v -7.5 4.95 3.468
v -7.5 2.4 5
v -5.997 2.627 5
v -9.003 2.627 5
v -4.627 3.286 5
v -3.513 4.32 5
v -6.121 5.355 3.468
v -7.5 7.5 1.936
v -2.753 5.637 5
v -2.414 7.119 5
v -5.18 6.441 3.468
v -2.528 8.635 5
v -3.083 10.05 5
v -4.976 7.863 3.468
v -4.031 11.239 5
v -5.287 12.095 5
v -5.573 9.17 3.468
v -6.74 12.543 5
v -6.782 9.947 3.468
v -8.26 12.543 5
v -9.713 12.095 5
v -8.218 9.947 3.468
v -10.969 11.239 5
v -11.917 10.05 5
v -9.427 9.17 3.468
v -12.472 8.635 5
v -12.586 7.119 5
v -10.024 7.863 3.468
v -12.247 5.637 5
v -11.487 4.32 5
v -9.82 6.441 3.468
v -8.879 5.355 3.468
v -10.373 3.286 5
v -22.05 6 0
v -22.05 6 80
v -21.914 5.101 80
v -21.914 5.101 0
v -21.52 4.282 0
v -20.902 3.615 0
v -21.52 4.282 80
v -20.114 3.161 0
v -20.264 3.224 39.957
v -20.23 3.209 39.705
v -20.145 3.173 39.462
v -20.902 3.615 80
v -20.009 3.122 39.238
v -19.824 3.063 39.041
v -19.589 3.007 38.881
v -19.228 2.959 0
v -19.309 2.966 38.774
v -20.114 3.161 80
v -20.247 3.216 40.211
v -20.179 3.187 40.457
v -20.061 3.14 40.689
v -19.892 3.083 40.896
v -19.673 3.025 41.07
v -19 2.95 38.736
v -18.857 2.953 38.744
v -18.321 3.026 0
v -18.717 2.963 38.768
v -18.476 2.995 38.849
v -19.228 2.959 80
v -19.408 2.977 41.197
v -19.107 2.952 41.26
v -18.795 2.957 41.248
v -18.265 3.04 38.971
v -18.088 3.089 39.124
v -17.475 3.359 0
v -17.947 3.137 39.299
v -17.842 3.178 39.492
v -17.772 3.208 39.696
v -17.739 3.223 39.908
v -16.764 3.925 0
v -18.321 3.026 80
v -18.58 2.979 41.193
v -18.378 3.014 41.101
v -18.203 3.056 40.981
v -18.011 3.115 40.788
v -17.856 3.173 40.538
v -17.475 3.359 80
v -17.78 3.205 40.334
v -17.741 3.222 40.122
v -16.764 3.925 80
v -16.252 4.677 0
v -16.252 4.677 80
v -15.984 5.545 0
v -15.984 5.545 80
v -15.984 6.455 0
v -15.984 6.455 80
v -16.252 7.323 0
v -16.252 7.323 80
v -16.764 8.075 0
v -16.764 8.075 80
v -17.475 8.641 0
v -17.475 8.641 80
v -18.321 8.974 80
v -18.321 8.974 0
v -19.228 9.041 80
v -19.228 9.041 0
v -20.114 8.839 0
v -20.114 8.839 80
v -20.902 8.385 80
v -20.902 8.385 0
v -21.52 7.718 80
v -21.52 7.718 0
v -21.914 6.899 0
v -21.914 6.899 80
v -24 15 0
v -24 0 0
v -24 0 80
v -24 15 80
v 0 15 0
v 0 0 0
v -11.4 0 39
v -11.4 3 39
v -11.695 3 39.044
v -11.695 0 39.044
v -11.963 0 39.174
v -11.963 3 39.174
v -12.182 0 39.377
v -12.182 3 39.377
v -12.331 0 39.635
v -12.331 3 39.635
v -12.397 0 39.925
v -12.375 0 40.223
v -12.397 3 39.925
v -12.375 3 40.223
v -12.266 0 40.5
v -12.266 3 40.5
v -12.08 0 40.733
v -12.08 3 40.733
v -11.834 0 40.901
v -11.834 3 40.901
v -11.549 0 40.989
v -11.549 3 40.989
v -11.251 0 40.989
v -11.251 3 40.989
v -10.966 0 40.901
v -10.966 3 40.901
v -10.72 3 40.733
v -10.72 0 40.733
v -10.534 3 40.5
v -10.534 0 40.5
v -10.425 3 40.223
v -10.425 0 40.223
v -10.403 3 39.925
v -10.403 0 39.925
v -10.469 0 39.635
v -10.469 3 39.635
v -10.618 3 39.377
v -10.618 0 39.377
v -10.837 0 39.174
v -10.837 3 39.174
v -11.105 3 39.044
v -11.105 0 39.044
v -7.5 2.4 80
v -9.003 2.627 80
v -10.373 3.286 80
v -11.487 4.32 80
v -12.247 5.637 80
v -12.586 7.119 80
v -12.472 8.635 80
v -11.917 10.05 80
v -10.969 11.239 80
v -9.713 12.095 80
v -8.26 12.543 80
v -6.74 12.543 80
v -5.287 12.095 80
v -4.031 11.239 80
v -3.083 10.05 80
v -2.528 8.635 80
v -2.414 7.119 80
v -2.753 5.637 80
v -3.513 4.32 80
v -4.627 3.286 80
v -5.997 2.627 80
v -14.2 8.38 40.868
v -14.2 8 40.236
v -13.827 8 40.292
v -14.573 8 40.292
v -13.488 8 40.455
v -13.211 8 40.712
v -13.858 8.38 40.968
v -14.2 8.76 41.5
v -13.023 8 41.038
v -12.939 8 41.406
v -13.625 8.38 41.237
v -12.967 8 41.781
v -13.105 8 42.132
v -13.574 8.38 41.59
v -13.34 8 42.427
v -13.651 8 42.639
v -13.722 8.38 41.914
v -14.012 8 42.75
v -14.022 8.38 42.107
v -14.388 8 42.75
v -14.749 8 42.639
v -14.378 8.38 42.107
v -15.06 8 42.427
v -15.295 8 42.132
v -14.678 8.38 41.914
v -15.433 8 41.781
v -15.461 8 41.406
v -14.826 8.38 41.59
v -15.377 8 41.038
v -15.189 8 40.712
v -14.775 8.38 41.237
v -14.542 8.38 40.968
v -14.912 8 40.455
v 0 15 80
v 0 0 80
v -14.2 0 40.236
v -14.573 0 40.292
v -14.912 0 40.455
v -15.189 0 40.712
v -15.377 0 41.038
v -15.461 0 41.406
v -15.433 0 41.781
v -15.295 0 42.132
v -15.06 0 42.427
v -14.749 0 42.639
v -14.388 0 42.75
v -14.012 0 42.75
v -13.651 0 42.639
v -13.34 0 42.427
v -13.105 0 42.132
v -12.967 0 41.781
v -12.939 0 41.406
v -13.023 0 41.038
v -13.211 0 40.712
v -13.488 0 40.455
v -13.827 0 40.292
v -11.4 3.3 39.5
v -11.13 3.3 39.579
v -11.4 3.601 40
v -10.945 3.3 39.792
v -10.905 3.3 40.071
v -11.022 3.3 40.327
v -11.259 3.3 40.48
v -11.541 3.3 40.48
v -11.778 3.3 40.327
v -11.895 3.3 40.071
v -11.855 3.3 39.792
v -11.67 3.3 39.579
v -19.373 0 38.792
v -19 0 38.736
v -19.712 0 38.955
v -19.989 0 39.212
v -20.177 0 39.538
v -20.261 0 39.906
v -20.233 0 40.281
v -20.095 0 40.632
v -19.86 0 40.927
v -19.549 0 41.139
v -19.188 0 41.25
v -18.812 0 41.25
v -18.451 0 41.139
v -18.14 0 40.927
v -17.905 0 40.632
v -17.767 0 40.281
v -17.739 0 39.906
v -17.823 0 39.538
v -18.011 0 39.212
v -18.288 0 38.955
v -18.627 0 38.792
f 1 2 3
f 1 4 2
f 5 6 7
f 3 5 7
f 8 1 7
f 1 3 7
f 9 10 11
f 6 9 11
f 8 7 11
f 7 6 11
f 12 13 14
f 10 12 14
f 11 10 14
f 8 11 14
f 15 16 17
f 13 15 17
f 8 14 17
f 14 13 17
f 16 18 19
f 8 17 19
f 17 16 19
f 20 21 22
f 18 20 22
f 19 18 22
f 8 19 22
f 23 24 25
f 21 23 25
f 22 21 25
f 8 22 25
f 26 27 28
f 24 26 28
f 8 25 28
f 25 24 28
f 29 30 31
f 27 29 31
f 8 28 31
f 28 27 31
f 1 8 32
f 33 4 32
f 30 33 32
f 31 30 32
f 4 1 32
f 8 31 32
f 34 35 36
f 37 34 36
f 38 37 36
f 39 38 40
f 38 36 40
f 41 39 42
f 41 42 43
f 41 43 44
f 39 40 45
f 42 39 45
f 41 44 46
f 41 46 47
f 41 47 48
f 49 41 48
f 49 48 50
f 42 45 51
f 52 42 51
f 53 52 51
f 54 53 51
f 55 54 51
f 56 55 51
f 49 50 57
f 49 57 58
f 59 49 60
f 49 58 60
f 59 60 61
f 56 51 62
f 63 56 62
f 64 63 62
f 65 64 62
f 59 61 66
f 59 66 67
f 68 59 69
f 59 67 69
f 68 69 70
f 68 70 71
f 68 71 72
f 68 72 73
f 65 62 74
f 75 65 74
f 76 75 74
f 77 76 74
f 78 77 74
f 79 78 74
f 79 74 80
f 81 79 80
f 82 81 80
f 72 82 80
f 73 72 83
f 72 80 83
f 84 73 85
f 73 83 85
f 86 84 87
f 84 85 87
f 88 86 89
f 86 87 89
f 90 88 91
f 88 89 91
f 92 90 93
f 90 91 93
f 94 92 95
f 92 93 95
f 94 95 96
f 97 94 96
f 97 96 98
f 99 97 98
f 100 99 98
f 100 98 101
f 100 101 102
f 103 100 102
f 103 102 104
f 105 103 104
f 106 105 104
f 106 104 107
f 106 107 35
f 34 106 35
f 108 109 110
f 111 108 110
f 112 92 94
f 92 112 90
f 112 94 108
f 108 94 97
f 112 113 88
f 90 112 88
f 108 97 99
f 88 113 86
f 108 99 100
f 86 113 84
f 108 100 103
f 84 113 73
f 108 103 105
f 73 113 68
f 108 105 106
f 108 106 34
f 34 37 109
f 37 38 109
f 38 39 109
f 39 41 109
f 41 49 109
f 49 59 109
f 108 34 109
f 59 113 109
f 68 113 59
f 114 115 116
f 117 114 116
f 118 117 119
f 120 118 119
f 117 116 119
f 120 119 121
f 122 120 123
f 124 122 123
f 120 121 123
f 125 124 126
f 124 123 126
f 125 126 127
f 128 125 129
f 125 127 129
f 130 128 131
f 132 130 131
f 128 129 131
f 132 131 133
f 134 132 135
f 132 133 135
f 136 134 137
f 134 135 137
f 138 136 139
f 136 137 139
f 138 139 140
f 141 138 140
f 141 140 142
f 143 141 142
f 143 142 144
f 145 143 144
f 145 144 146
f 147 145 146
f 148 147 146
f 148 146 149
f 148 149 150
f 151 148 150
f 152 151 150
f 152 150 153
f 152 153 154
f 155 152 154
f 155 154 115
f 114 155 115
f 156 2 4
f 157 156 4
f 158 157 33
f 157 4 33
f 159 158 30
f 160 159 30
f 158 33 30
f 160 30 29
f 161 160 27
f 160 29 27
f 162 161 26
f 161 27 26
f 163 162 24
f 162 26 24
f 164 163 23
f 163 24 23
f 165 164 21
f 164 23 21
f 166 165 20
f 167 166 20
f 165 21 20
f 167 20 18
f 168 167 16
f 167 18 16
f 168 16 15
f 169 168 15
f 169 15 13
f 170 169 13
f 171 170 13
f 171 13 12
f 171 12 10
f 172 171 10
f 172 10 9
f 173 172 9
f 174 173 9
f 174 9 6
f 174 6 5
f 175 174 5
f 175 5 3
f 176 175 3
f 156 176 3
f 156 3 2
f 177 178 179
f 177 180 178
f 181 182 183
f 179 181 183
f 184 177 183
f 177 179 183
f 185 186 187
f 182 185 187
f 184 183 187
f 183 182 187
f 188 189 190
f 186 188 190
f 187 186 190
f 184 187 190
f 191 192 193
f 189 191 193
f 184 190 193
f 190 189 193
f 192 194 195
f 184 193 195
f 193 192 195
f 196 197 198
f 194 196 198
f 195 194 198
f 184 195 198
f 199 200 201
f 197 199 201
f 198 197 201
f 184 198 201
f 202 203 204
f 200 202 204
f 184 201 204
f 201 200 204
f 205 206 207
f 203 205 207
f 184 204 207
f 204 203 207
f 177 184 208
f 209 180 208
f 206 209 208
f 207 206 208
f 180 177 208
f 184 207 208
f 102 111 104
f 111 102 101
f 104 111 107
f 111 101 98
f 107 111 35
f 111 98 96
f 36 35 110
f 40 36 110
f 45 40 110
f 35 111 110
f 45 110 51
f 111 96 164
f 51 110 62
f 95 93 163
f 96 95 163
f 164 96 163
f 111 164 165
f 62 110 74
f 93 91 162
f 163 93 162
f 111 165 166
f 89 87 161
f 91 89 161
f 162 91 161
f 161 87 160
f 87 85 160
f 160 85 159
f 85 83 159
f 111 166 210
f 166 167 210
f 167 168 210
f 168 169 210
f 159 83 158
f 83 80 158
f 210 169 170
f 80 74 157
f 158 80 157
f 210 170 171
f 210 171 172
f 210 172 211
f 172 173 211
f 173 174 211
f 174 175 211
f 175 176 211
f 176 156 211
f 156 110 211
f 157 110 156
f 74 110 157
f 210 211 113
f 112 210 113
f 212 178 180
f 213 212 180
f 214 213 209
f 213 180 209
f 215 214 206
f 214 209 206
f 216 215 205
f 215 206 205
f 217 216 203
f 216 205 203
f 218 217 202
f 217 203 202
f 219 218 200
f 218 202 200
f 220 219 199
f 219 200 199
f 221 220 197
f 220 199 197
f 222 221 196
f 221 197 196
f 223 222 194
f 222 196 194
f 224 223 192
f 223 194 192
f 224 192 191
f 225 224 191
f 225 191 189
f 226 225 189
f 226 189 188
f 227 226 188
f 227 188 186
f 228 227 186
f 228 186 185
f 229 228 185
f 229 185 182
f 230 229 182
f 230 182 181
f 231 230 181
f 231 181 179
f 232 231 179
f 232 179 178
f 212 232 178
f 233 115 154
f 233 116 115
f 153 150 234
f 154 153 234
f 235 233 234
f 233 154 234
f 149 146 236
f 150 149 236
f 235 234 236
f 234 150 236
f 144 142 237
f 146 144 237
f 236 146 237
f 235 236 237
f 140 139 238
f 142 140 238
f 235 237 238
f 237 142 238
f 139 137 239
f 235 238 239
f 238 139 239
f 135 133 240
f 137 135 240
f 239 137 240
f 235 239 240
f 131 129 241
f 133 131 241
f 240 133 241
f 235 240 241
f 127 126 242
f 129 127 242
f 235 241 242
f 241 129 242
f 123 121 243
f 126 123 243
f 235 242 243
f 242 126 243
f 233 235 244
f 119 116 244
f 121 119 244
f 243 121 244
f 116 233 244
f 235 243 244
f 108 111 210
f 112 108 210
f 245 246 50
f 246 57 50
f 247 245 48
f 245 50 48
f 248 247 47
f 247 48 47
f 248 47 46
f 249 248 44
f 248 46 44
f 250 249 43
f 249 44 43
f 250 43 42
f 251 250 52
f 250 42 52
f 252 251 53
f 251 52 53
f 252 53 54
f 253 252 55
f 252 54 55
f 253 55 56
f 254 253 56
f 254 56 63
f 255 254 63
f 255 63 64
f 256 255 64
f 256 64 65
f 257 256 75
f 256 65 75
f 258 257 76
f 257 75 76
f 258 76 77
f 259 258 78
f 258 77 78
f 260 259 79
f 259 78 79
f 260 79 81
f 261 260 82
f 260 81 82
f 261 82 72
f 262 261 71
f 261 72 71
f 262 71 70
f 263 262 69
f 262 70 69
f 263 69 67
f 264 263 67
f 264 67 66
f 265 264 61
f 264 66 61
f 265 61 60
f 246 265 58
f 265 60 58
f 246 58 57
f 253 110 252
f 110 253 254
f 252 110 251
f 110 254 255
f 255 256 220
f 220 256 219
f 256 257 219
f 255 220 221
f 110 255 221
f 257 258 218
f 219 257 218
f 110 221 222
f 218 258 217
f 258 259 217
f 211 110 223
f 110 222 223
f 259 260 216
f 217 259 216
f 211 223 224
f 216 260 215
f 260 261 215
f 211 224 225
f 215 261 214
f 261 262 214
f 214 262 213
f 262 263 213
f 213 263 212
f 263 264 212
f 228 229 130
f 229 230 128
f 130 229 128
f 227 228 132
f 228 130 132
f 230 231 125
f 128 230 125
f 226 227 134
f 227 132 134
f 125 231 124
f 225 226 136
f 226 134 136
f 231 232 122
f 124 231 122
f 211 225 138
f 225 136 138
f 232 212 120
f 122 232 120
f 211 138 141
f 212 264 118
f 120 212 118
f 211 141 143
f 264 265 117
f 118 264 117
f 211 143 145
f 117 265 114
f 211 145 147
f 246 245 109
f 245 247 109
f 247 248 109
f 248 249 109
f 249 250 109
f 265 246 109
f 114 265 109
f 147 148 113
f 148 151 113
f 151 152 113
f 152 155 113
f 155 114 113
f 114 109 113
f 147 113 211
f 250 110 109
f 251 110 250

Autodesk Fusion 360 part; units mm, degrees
sketch "Sketch1" plane through (0, 0, 0) normal (0, 1, 0) x (1, 0, 0)
  line L0 (0, 0) -> (-24, 0)
  line L1 (-24, 0) -> (-24, -80)
  line L2 (-24, -80) -> (0, -80)
  line L3 (0, -80) -> (0, 0)
  line L4 (-2.4, -80) -> (-2.4, 0) construction
  line L5 (-12.6, 0) -> (-12.6, -80) construction
  line L6 (-22.05, 0) -> (-22.05, -80) construction
  line L7 (-15.95, 0) -> (-15.95, -80) construction
  line L8 (-12.6, -40) -> (-2.4, -40) construction
  line L9 (-7.5, -40) -> (-7.5, 0) construction
  line L10 (-22.05, -40) -> (-15.95, -40) construction
  line L11 (-22.05, -40) -> (-24, -40) construction
  line L12 (-2.4, -40) -> (0, -40) construction
  line L13 (-12.6, -5) -> (-2.4, -5) construction
  line L14 (-14.2, -41.5) -> (-11.4, -41.5) construction
  line L15 (-11.4, -41.5) -> (-11.4, -40) construction
  line L16 (-11.4, -40) -> (-14.2, -40) construction
  line L17 (-14.2, -40) -> (-14.2, -41.5) construction
  point P0 (-19, -40)
  point P1 (-14.2, -41.5)
  point P2 (-11.4, -40)
  dimension "d1" = 24
  dimension "d2" = 80
  dimension "d3" = 10.2
  dimension "d5" = 6.1
  dimension "d7" = 5
  dimension "d8" = 7.5
  dimension "d9" = 75
  dimension "d12" = 1.5
  dimension "d13" = 2.8
  dimension "d14" = 1.2
extrude "Extrude1" add sketch "Sketch1" along normal blind 15
sketch "Sketch2" plane through (0, 0, 80) normal (0, 0, 1) x (-1, 0, 0)
  line L0 (24, 0) -> (0, 0)
  line L1 (0, 0) -> (0, -15)
  line L2 (0, -15) -> (24, -15)
  line L3 (24, -15) -> (24, 0)
  line L4 (15.95, 0) -> (15.95, -15) construction
  line L5 (22.05, 0) -> (22.05, -15) construction
  line L6 (12.6, 0) -> (12.6, -15) construction
  line L7 (2.4, 0) -> (2.4, -15) construction
  line L8 (12.6, -7.5) -> (2.4, -7.5) construction
  line L9 (15.95, -6) -> (22.05, -6) construction
  circle A0 centre (7.5, -7.5) radius 5.1
  circle A1 centre (19, -6) radius 3.05
  point P0 (22.05, 0)
  point P1 (15.95, 0)
  point P2 (12.6, 0)
  point P3 (2.4, 0)
  point P4 (19, 0)
  dimension "d15" = 6
extrude "Extrude2" cut sketch "Sketch2" against normal through all contours A1
hole "Hole1" at (-7.5, 7.5, 80) direction (0, 0, -1) diameter 10.2 depth 75 tip angle 118
hole "Hole2" at (-14.2, 0, 41.5) direction (0, 1, 0) diameter 2.529 depth 8 tip angle 118
hole "Hole3" at (-19, 0, 40) direction (0, 1, 0) diameter 2.529 depth 6 tip angle 118
hole "Hole4" at (-11.4, 0, 40) direction (0, 1, 0) diameter 2 depth 3 tip angle 118
